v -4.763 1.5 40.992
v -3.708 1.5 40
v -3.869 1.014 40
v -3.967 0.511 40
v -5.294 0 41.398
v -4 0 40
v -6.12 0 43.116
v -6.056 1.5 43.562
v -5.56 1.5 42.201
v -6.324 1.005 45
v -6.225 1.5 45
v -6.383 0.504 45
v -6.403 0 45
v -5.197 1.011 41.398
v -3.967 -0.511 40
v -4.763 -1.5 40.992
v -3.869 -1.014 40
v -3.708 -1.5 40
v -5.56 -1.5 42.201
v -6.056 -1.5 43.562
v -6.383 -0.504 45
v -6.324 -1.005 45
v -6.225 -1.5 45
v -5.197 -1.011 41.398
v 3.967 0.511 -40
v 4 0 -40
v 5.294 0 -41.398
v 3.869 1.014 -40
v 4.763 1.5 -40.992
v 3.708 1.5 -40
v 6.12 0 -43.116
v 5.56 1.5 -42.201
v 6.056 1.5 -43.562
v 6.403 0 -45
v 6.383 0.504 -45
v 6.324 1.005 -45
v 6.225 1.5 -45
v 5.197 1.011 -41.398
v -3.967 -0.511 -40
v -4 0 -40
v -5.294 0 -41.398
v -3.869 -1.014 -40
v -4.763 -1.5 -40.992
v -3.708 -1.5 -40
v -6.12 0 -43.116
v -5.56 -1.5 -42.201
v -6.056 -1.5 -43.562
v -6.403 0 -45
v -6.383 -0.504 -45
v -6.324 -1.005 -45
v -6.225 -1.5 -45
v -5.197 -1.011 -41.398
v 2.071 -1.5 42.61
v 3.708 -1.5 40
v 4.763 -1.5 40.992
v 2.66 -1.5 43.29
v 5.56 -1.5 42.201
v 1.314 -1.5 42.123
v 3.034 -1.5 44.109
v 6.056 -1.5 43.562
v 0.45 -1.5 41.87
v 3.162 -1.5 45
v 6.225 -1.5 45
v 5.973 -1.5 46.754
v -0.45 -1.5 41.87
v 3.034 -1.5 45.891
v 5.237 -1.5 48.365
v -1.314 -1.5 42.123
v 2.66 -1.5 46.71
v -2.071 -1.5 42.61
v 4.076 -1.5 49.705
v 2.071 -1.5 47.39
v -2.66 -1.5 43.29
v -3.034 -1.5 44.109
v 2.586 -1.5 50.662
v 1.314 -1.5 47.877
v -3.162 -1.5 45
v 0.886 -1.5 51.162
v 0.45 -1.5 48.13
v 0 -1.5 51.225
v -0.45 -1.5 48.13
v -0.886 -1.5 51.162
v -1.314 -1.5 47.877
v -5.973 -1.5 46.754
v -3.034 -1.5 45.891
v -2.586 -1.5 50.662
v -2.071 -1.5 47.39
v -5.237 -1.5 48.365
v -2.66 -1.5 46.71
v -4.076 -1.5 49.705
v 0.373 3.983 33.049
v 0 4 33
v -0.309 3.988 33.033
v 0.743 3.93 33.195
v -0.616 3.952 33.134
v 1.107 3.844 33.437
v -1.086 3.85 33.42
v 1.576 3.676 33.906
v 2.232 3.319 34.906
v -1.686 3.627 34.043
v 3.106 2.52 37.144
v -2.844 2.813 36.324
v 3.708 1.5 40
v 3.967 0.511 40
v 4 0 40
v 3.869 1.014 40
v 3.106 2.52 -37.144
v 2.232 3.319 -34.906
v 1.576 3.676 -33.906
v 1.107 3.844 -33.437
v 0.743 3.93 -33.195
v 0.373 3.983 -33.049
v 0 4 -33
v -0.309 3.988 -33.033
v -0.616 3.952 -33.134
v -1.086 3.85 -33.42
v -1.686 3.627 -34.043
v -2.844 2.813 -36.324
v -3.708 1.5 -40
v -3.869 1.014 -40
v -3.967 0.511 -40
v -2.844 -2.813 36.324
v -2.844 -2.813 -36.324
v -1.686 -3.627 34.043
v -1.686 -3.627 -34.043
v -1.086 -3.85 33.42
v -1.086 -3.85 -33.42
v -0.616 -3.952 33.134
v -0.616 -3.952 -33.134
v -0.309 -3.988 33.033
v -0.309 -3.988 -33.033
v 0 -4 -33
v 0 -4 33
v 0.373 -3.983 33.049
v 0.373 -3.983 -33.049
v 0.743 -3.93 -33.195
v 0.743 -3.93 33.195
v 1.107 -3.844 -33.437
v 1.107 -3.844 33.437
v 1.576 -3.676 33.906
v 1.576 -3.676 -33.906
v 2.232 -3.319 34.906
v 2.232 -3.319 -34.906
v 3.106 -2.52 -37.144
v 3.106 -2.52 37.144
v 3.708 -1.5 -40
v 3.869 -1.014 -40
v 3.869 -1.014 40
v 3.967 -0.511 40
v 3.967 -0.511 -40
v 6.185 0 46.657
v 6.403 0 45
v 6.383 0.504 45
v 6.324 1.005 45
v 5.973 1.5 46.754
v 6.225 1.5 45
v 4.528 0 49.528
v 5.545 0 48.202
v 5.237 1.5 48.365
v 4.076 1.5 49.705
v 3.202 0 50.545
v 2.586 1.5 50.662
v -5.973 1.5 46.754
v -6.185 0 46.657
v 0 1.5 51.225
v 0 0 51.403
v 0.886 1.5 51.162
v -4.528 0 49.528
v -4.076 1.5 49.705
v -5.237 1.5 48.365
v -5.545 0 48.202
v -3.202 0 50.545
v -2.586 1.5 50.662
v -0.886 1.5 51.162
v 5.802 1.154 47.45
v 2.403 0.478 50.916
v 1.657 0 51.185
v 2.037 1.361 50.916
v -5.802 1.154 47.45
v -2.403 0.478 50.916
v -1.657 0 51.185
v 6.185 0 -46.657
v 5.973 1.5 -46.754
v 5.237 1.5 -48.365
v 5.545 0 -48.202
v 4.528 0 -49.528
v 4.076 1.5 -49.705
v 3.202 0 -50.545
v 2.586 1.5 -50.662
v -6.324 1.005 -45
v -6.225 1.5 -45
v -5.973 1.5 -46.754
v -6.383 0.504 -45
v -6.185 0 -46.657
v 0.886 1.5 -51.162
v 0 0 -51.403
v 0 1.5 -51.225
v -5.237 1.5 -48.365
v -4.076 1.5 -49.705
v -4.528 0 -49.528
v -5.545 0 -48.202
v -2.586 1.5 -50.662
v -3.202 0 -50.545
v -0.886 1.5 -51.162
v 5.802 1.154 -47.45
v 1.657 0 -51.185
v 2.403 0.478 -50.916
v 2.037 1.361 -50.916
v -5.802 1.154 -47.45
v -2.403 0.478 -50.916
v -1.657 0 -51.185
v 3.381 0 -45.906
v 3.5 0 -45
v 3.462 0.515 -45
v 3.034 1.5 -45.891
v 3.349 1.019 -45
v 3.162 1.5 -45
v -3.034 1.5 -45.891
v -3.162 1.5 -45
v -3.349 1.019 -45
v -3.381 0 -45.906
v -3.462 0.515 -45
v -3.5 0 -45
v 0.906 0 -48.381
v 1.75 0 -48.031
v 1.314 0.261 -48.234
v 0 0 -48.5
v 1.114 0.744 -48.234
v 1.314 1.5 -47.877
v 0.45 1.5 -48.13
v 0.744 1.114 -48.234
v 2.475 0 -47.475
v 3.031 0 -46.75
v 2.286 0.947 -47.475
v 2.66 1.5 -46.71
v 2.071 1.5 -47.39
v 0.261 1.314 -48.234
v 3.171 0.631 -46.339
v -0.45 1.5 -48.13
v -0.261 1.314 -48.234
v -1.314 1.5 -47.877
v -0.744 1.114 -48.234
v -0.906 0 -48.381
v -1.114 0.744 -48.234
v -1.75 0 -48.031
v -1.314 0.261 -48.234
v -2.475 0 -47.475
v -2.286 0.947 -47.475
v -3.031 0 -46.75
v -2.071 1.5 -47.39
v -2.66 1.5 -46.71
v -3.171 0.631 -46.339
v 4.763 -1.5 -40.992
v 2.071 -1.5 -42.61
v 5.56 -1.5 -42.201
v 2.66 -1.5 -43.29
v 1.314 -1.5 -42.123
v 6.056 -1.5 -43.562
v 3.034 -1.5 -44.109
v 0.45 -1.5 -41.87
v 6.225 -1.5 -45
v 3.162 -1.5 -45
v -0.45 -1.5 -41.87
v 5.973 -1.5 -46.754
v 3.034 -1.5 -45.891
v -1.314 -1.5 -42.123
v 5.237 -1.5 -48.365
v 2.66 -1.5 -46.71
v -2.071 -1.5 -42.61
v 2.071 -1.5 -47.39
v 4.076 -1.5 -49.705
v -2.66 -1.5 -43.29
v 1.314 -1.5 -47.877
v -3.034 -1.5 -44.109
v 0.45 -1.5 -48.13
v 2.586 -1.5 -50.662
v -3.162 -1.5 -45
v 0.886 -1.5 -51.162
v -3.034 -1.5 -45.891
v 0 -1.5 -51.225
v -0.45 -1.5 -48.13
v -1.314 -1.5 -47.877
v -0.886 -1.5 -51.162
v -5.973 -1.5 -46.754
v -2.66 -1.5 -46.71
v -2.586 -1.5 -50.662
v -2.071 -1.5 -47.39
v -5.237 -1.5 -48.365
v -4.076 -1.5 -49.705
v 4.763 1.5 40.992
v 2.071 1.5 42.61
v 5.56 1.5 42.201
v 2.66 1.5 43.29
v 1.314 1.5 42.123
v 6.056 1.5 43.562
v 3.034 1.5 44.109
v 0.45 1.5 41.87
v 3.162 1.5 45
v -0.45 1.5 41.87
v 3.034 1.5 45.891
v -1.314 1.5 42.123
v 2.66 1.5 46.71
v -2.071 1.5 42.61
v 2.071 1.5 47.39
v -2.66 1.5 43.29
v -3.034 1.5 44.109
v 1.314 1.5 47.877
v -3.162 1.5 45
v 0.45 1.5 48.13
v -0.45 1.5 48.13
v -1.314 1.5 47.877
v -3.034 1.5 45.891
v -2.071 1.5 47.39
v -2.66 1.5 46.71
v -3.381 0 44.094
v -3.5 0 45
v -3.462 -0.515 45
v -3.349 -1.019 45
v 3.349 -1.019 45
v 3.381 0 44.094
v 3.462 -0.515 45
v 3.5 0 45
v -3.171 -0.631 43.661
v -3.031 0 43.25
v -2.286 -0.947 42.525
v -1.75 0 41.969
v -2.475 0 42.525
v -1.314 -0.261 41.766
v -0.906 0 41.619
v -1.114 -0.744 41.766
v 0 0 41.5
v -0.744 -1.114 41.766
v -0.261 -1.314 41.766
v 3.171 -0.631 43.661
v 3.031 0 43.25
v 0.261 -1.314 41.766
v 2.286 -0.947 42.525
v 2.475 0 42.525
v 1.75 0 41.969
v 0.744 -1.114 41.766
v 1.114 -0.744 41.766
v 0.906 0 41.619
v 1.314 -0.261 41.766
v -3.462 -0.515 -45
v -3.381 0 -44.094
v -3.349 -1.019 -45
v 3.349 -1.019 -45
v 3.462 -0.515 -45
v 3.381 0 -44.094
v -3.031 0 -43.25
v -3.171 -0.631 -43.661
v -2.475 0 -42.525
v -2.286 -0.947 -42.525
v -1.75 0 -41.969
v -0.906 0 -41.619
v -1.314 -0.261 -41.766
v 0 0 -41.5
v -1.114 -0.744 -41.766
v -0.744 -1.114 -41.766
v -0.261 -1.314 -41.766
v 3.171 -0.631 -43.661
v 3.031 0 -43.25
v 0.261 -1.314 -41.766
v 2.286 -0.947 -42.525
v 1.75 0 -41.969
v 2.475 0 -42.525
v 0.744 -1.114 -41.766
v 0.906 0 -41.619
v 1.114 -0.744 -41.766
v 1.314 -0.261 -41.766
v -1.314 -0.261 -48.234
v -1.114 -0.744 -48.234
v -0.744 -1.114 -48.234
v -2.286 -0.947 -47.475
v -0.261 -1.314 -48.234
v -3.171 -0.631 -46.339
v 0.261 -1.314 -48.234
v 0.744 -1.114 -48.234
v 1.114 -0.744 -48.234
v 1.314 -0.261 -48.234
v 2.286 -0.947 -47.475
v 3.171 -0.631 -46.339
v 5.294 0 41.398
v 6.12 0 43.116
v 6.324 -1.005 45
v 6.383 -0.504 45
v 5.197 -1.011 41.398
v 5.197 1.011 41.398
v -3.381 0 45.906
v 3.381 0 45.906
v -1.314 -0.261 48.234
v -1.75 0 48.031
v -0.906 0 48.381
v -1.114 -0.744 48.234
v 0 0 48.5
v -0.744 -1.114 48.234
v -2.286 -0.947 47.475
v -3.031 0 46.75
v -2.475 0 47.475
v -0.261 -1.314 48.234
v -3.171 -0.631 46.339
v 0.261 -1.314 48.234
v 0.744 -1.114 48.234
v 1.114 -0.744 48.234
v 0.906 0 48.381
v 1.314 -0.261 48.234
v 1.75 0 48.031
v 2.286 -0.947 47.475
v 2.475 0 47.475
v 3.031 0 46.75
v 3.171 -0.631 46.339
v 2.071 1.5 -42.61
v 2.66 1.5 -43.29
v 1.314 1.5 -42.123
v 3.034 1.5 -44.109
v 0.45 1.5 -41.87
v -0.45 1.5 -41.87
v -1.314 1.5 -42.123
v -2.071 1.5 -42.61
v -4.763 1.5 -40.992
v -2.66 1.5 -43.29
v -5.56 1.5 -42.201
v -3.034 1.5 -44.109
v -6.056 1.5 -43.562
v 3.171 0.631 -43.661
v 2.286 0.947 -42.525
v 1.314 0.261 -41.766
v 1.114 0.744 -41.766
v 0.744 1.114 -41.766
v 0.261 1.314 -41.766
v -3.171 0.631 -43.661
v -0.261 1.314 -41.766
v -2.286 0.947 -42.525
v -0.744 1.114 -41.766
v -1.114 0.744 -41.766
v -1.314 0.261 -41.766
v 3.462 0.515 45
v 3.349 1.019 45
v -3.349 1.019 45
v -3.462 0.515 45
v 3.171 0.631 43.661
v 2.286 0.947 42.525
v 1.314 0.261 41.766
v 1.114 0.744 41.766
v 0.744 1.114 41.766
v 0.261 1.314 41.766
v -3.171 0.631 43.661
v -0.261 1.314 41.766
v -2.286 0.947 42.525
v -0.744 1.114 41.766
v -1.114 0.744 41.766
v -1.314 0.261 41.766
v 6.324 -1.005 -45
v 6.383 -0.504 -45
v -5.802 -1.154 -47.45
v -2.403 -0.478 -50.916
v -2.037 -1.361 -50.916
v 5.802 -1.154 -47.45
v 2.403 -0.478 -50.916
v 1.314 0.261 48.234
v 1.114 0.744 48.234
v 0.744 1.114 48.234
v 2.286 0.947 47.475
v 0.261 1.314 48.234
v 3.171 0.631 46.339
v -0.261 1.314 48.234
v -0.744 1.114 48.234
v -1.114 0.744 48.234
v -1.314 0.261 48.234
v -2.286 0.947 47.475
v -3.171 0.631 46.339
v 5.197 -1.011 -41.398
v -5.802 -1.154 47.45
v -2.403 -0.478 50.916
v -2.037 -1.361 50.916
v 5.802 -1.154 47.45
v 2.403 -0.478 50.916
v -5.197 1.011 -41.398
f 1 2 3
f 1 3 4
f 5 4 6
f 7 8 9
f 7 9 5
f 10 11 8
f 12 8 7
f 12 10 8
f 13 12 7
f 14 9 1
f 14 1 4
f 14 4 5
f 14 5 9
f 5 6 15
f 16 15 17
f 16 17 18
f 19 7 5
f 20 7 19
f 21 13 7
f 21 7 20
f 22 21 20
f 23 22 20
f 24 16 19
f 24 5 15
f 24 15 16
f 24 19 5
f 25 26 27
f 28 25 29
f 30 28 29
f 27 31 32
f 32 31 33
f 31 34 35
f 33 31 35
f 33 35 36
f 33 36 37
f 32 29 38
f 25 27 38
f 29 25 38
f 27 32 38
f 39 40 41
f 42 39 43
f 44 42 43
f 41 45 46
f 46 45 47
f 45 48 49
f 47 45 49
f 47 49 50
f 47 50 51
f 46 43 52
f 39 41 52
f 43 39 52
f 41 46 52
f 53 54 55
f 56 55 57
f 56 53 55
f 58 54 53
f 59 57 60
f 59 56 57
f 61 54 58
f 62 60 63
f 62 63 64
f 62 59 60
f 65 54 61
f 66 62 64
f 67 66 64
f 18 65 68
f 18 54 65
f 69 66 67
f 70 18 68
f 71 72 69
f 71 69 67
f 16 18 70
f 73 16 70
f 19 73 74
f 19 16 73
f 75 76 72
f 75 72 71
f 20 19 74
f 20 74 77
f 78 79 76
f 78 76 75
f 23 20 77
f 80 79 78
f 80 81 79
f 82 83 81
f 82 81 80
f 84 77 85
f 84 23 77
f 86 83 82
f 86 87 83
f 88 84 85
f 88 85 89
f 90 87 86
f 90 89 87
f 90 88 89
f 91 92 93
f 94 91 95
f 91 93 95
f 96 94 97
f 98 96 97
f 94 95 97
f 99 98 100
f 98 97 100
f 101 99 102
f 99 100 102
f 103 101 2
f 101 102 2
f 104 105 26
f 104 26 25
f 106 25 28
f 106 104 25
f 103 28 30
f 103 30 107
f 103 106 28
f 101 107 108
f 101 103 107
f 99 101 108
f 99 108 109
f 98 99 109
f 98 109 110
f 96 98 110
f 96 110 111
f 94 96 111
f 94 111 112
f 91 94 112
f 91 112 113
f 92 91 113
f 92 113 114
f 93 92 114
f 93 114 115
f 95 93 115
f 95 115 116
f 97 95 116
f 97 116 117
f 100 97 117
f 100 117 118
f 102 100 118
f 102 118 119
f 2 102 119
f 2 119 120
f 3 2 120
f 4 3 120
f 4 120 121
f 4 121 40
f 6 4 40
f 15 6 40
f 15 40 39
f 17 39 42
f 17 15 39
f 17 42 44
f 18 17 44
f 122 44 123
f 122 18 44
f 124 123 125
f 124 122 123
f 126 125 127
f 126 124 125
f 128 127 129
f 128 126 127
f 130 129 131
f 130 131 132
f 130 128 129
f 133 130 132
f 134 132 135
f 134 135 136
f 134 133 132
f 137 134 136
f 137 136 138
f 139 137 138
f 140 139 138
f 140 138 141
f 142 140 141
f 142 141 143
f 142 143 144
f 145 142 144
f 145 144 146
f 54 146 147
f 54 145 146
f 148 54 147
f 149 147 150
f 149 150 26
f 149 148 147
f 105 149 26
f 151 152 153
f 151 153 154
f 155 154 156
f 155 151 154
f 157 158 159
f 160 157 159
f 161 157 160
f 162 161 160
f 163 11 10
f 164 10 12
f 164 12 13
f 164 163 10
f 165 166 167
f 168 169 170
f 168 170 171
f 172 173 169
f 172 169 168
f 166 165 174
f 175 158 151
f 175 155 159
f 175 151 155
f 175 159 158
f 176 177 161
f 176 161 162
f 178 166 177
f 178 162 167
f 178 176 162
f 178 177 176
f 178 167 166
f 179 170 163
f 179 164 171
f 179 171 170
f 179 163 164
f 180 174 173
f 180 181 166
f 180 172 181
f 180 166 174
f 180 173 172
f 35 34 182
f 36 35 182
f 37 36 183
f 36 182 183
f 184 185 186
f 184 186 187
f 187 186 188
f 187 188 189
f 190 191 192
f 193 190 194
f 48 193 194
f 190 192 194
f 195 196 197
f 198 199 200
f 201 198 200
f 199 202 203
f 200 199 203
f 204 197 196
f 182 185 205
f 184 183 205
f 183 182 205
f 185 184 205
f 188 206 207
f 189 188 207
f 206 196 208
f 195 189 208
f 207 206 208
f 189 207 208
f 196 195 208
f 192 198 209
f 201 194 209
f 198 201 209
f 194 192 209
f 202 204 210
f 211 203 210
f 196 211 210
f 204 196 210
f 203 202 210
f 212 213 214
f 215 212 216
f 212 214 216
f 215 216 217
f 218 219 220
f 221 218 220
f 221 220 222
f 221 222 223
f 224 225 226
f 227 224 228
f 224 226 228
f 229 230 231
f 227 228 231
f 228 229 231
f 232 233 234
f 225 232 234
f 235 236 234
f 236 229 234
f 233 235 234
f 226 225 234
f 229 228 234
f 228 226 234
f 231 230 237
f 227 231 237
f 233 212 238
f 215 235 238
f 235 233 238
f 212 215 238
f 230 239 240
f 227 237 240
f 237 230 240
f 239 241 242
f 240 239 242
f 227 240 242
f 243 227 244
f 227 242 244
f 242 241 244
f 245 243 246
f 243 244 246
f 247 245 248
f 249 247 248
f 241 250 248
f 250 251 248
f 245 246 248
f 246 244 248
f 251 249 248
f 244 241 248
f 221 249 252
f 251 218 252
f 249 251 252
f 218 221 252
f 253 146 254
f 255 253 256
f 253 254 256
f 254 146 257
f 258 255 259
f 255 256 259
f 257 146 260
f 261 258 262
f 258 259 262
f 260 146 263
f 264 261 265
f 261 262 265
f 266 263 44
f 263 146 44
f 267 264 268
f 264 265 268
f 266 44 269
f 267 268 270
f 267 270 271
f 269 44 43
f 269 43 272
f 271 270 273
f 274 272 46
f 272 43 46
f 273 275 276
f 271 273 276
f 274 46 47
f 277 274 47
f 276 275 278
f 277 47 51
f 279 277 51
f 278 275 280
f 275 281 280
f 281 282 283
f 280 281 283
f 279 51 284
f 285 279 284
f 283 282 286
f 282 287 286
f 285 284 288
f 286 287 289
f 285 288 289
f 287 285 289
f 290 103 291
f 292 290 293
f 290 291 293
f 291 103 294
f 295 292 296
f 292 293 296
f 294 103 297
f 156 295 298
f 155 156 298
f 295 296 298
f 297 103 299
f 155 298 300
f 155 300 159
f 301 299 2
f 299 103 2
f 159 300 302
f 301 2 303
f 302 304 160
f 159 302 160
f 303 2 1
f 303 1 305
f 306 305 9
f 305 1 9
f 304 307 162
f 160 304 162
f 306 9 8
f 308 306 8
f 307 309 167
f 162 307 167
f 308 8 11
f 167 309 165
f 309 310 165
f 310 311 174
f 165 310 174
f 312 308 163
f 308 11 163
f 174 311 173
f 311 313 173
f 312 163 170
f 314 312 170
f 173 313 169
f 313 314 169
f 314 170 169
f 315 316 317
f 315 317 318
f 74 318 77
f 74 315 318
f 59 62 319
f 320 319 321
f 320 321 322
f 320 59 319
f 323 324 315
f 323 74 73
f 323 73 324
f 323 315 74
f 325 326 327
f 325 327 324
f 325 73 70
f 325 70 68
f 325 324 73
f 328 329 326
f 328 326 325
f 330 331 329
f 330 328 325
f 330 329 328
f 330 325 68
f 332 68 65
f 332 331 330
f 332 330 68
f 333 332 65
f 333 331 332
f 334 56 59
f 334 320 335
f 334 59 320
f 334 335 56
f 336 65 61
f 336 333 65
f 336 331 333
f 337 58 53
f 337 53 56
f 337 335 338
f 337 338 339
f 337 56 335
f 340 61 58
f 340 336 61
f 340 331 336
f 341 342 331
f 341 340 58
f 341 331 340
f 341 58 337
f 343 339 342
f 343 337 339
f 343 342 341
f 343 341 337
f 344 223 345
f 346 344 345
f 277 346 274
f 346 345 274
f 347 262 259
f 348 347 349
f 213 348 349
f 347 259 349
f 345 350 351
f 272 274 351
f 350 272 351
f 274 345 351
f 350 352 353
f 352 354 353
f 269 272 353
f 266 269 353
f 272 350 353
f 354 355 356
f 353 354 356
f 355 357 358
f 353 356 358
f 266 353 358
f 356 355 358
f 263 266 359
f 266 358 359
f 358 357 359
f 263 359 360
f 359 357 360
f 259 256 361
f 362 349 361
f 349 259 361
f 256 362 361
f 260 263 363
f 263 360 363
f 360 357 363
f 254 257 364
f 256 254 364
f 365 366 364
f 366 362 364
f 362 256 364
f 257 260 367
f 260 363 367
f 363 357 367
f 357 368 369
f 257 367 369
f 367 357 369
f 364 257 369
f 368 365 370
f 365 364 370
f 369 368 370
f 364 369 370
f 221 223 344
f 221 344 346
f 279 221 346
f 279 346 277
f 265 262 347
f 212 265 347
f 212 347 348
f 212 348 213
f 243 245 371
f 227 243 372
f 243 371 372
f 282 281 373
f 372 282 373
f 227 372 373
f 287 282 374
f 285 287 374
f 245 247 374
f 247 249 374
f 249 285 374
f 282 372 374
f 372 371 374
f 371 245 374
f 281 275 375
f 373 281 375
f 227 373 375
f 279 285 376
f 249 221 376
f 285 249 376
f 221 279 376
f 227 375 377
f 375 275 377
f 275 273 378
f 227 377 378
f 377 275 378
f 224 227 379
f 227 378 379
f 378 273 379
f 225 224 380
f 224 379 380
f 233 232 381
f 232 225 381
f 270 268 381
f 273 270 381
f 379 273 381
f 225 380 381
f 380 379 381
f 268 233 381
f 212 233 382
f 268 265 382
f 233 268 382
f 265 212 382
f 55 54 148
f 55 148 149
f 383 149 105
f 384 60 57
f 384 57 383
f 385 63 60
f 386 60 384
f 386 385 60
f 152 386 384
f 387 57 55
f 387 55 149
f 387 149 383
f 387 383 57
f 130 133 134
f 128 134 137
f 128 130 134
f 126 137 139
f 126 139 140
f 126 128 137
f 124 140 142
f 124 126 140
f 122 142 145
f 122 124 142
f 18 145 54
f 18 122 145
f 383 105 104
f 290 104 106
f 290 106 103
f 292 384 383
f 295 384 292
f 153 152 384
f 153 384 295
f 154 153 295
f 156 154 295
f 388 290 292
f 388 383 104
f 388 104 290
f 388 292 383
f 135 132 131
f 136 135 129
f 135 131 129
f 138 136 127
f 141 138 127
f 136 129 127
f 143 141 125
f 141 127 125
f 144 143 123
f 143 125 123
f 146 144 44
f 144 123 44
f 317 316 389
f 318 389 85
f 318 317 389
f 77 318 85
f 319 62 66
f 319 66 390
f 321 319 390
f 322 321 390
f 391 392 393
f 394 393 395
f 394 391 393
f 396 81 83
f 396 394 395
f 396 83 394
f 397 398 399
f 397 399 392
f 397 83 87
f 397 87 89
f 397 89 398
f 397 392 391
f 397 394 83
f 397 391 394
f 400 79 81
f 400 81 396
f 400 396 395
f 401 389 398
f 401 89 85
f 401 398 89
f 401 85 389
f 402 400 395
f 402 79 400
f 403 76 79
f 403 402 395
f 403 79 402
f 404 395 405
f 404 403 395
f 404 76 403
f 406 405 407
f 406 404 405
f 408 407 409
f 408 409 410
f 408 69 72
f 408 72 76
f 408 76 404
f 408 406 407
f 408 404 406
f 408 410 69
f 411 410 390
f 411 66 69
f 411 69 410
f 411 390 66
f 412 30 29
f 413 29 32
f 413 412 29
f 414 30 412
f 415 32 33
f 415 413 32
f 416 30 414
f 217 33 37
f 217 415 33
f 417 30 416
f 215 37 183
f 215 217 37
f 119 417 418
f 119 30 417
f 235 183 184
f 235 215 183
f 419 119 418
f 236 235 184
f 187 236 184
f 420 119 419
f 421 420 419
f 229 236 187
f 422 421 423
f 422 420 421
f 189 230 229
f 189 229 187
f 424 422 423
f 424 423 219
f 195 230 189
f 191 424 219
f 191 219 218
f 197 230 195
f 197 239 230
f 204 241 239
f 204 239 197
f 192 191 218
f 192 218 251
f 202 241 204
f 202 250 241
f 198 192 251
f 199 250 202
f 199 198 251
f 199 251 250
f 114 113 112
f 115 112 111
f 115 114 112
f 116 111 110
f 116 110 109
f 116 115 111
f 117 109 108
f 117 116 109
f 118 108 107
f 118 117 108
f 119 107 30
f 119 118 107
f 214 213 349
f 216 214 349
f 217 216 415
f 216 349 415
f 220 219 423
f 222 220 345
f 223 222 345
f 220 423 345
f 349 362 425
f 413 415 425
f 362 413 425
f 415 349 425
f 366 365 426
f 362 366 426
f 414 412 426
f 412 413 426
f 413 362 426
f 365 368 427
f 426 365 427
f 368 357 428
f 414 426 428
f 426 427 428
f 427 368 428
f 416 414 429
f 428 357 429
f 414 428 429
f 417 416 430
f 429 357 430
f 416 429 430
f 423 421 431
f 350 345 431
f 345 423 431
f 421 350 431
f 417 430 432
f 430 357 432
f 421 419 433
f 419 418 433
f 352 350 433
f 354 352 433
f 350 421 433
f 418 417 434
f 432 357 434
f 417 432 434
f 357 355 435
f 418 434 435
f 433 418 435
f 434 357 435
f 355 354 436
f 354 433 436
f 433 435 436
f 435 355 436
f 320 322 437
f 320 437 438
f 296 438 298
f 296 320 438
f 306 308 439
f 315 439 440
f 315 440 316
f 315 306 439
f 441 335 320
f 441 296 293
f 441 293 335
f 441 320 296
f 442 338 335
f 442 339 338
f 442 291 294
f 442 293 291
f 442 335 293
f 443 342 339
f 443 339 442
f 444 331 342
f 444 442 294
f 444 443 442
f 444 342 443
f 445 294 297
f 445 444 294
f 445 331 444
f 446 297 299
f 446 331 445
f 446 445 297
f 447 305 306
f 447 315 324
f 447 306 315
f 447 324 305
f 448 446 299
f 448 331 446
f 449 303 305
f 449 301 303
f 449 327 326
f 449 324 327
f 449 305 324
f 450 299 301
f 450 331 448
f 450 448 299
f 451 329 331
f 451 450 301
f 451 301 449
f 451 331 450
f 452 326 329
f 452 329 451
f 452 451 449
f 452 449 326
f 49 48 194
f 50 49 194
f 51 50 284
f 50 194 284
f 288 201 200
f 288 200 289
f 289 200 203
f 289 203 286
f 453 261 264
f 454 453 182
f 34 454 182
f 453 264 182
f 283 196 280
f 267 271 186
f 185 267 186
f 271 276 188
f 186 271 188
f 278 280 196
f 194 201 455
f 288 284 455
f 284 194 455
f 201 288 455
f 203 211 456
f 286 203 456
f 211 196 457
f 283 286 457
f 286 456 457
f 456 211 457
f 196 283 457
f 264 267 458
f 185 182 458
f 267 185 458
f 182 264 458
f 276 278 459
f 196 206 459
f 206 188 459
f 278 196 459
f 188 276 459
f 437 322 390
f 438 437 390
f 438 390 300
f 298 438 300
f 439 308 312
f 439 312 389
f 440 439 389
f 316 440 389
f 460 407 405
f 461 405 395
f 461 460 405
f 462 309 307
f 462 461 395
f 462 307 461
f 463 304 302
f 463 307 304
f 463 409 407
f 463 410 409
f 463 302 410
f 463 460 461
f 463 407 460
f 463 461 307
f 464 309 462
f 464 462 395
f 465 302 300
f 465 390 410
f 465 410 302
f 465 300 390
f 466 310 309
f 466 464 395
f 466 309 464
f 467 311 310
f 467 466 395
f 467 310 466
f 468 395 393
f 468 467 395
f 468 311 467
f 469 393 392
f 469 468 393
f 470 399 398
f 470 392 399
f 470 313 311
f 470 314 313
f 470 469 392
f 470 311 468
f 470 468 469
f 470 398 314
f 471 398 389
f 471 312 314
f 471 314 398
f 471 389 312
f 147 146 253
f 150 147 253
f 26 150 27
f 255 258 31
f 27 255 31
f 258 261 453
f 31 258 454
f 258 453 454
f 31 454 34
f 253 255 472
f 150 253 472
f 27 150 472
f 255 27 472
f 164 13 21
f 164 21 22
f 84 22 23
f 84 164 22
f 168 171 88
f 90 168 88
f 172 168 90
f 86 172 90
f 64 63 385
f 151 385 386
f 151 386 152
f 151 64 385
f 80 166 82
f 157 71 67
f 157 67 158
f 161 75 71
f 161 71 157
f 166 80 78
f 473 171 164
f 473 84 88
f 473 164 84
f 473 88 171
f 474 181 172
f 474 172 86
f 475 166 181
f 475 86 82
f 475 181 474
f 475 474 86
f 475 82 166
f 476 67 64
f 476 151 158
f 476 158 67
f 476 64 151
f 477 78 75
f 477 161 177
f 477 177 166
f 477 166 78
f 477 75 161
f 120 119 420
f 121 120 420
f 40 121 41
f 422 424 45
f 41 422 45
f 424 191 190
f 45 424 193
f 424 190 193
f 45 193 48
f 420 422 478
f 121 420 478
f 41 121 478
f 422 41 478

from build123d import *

# Parameters (mm, degrees)
SKETCH_1_R               = 4
EXTRUDE_1_DEPTH          = 40
CUT_EXTRUDE_1_DEPTH      = 53.194647057
CUT_EXTRUDE_1_DEPTH_BACK = 53.194647057


with BuildPart() as part:
    # 草图1 → 凸台-拉伸1 (new, symmetric)
    with BuildSketch(Plane.XY):
        Circle(SKETCH_1_R)
    extrude(amount=EXTRUDE_1_DEPTH, both=True)

    # 草图2 → 旋转2 (revolve)
    with BuildSketch(Plane(origin=(0, 0, 0), x_dir=(1, 0, 0), z_dir=(0, 1, 0))):
        with BuildLine():
            ThreePointArc((0, 38.596875763), (6.403124237, 45), (0, 51.403124237))
            Line((0, 51.403124237), (0, 48.5))
            ThreePointArc((0, 48.5), (3.5, 45), (0, 41.5))
            Line((0, 41.5), (0, 38.596875763))
        make_face()
        with BuildLine():
            Line((0, -48.5), (0, -51.403124237))
            ThreePointArc((0, -51.403124237), (6.403124237, -45), (0, -38.596875763))
            Line((0, -38.596875763), (0, -41.5))
            ThreePointArc((0, -41.5), (3.5, -45), (0, -48.5))
        make_face()
    revolve(axis=Axis((0, 0, -51.403124237), (0, 0, 1)))

    # 草图3 → 切除-拉伸1 (cut, two sides: drawn at the far end of the back side and taken through both)
    with BuildSketch(Plane(origin=(0, 0, 0), x_dir=(0, 0, -1), z_dir=(1, 0, 0)).offset(-CUT_EXTRUDE_1_DEPTH_BACK)):
        Polygon((-33, 4), (-40, 1.5), (-53, 1.5), (-53, 8), (-33, 8), align=None)
        Polygon((-33, -8), (-33, -4), (-40, -1.5), (-53, -1.5), (-53, -8), align=None)
        Polygon((33, -4), (40, -1.5), (53, -1.5), (53, -8), (33, -8), align=None)
        Polygon((33, 8), (33, 4), (40, 1.5), (53, 1.5), (53, 8), align=None)
    extrude(amount=CUT_EXTRUDE_1_DEPTH + CUT_EXTRUDE_1_DEPTH_BACK, mode=Mode.SUBTRACT)


solid = part.part
